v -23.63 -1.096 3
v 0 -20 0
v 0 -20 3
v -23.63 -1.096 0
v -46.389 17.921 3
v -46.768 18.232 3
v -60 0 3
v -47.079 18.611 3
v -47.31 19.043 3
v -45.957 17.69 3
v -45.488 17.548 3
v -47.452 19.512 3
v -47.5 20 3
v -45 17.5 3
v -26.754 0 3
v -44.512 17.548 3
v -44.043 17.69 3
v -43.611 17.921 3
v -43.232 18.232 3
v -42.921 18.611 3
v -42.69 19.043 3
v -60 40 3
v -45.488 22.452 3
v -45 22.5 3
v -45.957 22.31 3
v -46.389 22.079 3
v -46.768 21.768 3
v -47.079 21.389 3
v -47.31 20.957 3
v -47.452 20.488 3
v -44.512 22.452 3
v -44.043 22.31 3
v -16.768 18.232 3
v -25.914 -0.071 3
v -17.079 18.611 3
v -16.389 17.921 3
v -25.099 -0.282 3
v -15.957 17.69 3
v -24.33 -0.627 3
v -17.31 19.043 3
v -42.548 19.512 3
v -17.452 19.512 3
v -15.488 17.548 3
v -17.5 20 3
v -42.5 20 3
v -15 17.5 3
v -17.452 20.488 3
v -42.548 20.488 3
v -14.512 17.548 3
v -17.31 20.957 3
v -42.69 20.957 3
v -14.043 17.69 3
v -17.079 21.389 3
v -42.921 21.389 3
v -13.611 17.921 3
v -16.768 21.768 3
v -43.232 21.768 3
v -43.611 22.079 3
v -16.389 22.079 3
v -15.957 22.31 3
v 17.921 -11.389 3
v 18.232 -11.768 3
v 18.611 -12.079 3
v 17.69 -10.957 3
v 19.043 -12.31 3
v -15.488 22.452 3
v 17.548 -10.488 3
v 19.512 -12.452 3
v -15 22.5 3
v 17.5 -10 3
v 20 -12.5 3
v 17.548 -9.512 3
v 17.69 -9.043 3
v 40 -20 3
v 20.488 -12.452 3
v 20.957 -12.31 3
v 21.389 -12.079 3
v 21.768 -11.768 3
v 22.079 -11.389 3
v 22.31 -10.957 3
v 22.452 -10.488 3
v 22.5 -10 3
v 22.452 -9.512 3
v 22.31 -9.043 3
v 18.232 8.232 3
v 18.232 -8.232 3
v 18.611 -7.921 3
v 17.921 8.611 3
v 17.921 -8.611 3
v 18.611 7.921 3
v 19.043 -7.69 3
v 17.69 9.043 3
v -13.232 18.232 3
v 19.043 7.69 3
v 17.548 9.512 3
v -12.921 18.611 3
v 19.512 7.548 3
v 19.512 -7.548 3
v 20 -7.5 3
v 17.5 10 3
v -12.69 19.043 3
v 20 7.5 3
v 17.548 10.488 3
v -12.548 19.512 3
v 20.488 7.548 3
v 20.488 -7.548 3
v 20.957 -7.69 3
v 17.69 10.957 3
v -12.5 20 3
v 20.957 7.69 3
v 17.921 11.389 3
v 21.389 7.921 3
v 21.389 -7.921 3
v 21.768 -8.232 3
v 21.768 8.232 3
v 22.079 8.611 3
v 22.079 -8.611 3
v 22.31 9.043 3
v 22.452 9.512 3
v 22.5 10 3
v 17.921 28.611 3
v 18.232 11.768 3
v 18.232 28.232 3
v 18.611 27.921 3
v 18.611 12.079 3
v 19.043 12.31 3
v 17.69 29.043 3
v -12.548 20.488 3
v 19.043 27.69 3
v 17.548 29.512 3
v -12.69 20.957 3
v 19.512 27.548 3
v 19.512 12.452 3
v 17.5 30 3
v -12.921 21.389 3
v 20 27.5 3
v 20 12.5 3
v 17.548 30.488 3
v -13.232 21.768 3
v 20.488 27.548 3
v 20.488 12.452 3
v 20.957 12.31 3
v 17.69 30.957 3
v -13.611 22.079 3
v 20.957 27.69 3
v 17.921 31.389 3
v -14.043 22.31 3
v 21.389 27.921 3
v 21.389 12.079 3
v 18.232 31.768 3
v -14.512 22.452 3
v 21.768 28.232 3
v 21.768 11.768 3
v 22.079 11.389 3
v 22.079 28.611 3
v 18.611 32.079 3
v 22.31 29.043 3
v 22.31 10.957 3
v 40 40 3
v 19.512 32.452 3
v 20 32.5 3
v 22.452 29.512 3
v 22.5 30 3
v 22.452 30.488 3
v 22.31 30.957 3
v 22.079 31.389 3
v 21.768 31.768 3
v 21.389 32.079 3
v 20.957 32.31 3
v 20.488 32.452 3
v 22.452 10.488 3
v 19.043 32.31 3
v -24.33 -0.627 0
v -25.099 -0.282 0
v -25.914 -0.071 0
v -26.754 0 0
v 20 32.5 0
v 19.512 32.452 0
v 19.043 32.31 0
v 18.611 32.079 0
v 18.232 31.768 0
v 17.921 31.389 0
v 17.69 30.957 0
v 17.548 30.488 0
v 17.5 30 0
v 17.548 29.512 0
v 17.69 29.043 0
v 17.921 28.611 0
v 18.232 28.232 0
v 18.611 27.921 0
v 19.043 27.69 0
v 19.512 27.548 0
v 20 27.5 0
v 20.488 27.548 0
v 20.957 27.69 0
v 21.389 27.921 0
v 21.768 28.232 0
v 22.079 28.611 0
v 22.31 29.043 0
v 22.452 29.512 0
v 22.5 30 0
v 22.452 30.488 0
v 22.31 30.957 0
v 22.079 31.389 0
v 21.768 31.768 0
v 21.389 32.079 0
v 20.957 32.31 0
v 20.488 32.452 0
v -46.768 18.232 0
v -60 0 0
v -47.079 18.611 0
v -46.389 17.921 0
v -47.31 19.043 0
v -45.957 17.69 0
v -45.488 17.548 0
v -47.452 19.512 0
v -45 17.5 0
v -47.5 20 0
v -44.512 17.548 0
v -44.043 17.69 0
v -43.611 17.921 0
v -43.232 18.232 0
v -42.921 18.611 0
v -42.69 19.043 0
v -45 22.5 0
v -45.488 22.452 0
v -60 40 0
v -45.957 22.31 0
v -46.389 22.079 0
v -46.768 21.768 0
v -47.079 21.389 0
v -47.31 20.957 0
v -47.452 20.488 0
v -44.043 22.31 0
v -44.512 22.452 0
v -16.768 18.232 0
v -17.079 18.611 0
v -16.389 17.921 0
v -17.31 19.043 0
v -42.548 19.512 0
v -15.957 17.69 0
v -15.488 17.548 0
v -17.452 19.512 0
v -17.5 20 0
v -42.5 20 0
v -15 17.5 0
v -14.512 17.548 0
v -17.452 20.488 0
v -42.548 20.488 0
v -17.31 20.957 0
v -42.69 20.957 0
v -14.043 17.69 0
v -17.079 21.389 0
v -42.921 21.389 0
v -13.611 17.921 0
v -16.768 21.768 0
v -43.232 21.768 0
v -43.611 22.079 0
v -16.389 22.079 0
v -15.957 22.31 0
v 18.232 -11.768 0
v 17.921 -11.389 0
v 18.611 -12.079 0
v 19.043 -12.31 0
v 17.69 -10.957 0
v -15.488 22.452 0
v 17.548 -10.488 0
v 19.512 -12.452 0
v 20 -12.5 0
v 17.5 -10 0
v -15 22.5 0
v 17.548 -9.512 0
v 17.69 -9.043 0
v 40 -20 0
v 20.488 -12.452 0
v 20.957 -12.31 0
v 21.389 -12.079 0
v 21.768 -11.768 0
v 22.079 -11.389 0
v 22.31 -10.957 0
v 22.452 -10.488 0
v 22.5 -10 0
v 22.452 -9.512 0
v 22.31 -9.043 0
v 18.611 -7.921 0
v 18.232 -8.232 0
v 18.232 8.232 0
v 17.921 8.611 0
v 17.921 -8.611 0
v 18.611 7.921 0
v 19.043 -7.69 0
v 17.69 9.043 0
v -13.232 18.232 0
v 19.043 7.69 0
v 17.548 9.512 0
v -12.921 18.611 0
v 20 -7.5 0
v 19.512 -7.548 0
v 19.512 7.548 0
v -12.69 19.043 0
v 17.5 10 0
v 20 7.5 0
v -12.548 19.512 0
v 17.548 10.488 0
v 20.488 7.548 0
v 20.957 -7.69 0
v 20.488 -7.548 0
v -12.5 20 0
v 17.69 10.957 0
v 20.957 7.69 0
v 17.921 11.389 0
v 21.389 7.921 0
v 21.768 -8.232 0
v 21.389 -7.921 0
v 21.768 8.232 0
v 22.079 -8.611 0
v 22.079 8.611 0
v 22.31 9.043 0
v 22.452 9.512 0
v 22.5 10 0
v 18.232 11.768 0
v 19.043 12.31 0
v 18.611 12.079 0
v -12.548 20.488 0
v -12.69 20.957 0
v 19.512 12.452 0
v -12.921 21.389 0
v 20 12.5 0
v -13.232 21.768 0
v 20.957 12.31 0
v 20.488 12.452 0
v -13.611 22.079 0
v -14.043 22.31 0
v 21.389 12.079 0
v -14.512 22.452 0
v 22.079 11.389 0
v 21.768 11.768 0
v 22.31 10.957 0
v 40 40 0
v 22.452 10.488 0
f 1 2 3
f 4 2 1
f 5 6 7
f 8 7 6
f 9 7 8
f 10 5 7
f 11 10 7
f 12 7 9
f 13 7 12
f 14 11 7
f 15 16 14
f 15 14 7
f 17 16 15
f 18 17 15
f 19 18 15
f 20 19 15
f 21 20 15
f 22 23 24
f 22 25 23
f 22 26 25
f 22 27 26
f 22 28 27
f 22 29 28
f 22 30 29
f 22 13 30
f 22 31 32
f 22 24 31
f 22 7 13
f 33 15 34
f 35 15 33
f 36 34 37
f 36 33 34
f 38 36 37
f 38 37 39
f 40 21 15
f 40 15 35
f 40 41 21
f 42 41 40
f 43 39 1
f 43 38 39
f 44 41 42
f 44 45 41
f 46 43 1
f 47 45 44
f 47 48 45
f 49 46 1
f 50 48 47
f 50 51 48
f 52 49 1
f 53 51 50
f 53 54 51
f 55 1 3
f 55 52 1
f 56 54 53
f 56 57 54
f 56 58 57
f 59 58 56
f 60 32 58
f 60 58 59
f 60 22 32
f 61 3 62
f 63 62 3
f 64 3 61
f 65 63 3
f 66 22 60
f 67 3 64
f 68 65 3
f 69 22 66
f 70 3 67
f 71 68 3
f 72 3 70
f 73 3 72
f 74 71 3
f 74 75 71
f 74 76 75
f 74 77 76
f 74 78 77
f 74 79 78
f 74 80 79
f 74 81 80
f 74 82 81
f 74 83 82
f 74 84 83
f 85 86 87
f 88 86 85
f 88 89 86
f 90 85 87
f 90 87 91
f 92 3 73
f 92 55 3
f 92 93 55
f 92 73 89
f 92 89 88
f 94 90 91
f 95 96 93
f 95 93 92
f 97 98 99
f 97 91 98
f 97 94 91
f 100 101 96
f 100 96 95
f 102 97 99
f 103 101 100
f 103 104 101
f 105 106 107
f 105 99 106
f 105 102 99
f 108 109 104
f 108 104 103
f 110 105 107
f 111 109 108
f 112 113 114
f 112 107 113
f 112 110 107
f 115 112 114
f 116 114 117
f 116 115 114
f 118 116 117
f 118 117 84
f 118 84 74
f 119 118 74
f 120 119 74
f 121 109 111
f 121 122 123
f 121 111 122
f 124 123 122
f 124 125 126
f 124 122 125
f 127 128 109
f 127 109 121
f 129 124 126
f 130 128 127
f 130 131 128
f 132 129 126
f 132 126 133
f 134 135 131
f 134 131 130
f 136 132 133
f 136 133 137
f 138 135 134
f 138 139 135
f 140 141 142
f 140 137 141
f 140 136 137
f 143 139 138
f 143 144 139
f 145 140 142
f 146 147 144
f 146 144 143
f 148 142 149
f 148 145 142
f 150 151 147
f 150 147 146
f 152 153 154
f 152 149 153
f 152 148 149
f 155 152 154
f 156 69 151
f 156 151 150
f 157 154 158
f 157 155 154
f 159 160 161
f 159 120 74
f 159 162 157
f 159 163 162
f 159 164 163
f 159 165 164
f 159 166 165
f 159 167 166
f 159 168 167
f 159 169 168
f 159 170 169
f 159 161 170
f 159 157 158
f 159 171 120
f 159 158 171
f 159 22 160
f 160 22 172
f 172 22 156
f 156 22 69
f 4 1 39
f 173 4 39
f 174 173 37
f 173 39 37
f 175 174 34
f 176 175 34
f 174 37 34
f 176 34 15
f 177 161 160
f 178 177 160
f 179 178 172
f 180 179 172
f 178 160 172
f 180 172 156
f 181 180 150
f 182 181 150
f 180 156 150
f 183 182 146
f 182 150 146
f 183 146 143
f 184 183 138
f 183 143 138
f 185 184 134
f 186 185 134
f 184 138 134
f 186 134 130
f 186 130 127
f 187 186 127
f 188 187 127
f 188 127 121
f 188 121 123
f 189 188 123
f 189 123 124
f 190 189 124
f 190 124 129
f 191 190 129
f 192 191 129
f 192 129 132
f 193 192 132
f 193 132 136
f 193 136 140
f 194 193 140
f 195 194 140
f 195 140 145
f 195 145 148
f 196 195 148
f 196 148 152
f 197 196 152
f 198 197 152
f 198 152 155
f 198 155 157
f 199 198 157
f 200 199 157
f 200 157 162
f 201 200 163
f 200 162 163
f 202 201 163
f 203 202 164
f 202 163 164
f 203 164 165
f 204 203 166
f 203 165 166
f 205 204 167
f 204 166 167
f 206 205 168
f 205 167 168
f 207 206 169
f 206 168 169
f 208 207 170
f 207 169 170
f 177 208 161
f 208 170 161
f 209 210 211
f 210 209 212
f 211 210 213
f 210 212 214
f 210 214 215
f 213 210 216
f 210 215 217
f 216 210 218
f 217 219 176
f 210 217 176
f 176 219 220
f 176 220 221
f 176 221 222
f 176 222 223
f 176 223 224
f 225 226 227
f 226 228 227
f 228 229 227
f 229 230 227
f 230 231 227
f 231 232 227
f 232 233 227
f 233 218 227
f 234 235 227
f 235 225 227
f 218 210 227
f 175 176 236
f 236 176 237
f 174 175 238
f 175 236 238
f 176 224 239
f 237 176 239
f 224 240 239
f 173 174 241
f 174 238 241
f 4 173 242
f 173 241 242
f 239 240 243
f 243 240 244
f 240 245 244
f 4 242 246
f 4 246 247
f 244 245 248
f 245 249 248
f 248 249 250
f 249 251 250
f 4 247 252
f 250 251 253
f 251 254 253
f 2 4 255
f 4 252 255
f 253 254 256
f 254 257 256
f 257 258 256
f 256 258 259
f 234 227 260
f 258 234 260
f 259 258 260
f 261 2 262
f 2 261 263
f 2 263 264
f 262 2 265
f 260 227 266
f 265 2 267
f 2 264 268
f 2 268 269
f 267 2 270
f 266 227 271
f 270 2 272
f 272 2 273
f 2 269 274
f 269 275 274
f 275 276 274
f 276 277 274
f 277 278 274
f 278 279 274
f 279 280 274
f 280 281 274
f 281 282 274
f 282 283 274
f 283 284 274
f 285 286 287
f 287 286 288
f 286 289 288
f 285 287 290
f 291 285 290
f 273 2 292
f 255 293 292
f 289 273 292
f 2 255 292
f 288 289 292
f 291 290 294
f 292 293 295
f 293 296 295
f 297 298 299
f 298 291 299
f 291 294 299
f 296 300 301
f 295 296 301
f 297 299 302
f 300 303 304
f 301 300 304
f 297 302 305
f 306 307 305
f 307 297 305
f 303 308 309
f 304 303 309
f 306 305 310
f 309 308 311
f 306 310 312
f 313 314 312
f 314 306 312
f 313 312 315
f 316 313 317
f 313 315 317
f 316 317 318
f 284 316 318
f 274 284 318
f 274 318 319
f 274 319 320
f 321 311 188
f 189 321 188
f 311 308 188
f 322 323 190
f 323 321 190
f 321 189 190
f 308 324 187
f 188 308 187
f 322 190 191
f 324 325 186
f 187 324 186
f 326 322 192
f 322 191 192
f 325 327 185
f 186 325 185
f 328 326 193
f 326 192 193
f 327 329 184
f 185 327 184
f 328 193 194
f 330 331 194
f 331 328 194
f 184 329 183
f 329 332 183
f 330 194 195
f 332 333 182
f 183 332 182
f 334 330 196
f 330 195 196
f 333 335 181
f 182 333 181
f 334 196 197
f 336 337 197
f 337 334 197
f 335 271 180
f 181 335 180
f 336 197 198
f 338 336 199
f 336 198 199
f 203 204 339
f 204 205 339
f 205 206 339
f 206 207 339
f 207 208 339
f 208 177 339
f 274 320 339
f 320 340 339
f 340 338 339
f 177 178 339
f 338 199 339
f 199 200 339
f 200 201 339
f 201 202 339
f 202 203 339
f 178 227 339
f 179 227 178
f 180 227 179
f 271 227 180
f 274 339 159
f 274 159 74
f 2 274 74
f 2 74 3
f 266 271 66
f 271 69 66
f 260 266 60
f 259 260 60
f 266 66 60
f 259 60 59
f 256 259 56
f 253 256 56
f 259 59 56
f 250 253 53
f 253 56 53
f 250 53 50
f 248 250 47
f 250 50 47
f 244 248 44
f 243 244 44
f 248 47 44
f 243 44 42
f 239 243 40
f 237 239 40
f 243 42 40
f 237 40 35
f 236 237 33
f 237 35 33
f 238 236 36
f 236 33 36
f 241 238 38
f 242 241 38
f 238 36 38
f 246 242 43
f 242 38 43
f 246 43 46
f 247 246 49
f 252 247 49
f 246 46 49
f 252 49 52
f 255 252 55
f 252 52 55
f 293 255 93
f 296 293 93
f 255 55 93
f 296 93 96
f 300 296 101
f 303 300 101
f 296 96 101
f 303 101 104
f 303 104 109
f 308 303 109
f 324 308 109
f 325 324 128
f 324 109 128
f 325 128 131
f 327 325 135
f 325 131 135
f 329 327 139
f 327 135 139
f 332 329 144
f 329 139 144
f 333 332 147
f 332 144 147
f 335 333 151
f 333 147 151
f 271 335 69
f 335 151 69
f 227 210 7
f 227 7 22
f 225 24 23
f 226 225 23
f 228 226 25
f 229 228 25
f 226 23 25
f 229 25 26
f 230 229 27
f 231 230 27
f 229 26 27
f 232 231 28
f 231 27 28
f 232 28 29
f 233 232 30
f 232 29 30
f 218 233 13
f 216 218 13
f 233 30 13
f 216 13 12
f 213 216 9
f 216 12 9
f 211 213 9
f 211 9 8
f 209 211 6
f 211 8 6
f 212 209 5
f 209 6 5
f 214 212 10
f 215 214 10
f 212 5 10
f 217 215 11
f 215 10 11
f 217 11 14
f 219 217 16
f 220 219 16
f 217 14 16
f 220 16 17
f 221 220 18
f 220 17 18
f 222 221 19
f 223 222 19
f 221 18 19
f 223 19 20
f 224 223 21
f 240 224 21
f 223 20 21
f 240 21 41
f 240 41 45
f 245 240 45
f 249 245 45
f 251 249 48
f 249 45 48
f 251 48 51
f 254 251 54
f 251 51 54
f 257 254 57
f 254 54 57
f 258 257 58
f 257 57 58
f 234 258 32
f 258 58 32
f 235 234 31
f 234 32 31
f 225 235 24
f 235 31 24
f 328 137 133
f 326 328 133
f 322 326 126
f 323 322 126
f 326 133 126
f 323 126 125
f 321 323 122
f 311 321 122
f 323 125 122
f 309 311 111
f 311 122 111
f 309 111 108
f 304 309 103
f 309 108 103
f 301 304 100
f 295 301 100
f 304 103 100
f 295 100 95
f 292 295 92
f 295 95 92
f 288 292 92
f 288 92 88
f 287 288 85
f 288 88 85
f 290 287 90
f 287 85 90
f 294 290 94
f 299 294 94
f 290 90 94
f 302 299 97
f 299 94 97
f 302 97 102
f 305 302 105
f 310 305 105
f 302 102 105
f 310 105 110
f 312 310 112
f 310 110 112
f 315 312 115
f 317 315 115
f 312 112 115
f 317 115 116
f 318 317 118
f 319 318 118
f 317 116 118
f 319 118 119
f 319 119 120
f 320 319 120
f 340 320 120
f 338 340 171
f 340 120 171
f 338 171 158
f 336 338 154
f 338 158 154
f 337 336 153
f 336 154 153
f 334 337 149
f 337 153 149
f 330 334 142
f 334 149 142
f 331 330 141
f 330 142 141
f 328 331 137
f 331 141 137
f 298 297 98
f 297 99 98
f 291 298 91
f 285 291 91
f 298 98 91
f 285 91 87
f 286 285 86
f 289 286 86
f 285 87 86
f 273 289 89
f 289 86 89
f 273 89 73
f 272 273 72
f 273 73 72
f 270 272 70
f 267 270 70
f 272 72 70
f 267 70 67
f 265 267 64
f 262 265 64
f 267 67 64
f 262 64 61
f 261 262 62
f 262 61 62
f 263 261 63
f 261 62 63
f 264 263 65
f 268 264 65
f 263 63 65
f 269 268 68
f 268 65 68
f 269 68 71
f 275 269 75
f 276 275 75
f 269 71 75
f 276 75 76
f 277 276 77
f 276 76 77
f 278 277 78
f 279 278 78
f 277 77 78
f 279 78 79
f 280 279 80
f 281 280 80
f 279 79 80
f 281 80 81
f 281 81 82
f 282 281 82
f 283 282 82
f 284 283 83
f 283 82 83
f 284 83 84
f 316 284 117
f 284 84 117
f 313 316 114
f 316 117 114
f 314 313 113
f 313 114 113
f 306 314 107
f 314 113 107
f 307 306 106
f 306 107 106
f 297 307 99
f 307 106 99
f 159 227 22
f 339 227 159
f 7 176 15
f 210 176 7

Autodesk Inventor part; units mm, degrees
ref_plane "YZ Plane" through (0, 0, 0) normal (1, 0, 0) x (0, 1, 0)
ref_plane "XZ Plane" through (0, 0, 0) normal (0, 1, 0) x (-1, 0, 0)
ref_plane "XY Plane" through (0, 0, 0) normal (0, 0, 1) x (1, 0, 0)
sketch "Sketch1" plane through (0, 0, 0) normal (0, 0, 1) x (1, 0, 0)
  line L0 (0, 0) -> (0, 40) construction
  line L1 (0, 40) -> (-420, 40) construction
  line L2 (-420, 0) -> (-420, 40) construction
  line L3 (0, 0) -> (-420, 0) construction
  line L4 (40, 120) -> (0, 120) construction
  line L5 (0, 120) -> (0, -730) construction
  line L6 (40, -730) -> (0, -730) construction
  line L7 (40, 120) -> (40, -730) construction
  line L8 (0, 0) -> (40, 0) construction
  line L9 (40, 0) -> (40, 40) construction
  line L10 (40, 40) -> (0, 40) construction
  line L11 (0, 40) -> (0, 0) construction
  line L12 (0, 0) -> (-60, 0) construction
  line L13 (-60, 0) -> (-60, 40) construction
  line L14 (-60, 40) -> (0, 40) construction
  line L15 (0, 40) -> (0, 0) construction
  line L16 (-23.6304, 41.0957) -> (-1.8765, 58.4988) construction
  line L17 (0, 40) -> (40, 40) construction
  line L18 (40, 40) -> (40, 60) construction
  line L19 (40, 60) -> (0, 60) construction
  line L20 (0, 60) -> (0, 40) construction
  line L21 (-1.8765, 58.4988) -> (0, 60) construction
  line L22 (-23.6304, 41.0957) -> (-25, 40) construction
  line L23 (40, 0) -> (0, 0) construction
  line L24 (0, 0) -> (0, -20) construction
  line L25 (0, -20) -> (40, -20) construction
  line L26 (40, -20) -> (40, 0) construction
  line L27 (-25, 40) -> (-25, 0) construction
  line L28 (-25, 0) -> (0, -20) construction
  line L29 (20, -20) -> (20, 60) construction
  line L30 (0, 20) -> (-60, 20) construction
  line L31 (30, 10) -> (10, 10) construction
  line L32 (10, 10) -> (10, -10) construction
  line L33 (10, -10) -> (30, -10) construction
  line L34 (30, -10) -> (30, 10) construction
  line L35 (30, 10) -> (10, -10) construction
  line L36 (10, 10) -> (30, -10) construction
  line L37 (30, 30) -> (10, 30) construction
  line L38 (10, 30) -> (10, 50) construction
  line L39 (10, 50) -> (30, 50) construction
  line L40 (30, 50) -> (30, 30) construction
  line L41 (30, 30) -> (10, 50) construction
  line L42 (10, 30) -> (30, 50) construction
  line L43 (0, -20) -> (-25, 0)
  line L44 (-25, 0) -> (-60, 0)
  line L45 (-60, 0) -> (-60, 40)
  line L46 (-60, 40) -> (-25, 40)
  line L47 (-25, 40) -> (0, 60)
  line L48 (0, 60) -> (40, 60)
  line L49 (40, 60) -> (40, -20)
  line L50 (40, -20) -> (0, -20)
  line L51 (-30, 20) -> (-45, 20)
  line L52 (-30, 20) -> (-15, 20)
  point P0 (20, 0)
  point P1 (20, 0)
  point P2 (20, 40)
  point P3 (20, 30)
  point P4 (20, 10)
  point P5 (20, -10)
  dimension "d0" = 60
  dimension "d1" = 40
  dimension "d2" = 20
  dimension "d3" = 20
  dimension "d6" = 20
  dimension "d7" = 20
  dimension "d8" = 20
  dimension "d9" = 20
  dimension "d20" = 15
  dimension "d21" = 15
extrude "Extrusion1" add sketch "Sketch1" along normal blind 3
hole "Hole1" at (20, -10, 0) at (20, 10, 0) at (20, 30, 0) direction (0, 0, 1) diameter 5 depth 8 tip angle 118
fillet "Fillet1" radius 5 2 edges at (-25, 40, 1.5) (-25, 0, 1.5)
hole "Hole2" at (-45, 20, 0) at (-15, 20, 0) direction (0, 0, 1) diameter 5 depth 8 tip angle 118
sketch "Sketch2" plane through (0, 0, 3) normal (0, 0, 1) x (1, 0, 0)
  circle A0 centre (-45, 20) radius 2.5 projected
  circle A1 centre (-15, 20) radius 2.5 projected
  line L0 (40, -20) -> (40, 60) projected
  line L1 (40, 60) -> (0, 60) projected
  line L2 (0, 60) -> (-23.6304, 41.0957) projected
  arc A2 (-26.7539, 40) -> (-23.6304, 41.0957) centre (-26.7539, 45) ccw projected
  line L3 (-26.7539, 40) -> (-60, 40) projected
  line L4 (-60, 40) -> (-60, 0) projected
  line L5 (-60, 0) -> (-26.7539, 0) projected
  arc A3 (-23.6304, -1.0957) -> (-26.7539, 0) centre (-26.7539, -5) ccw projected
  line L6 (-23.6304, -1.0957) -> (0, -20) projected
  line L7 (0, -20) -> (40, -20) projected
  line L8 (-26.7539, 40) -> (-60, 40) projected
  line L9 (-26.7539, 40) -> (40, 40)
  point P0 (0, 0)
extrude "Extrusion2" cut sketch "Sketch2" against normal blind 3 contours L9 A2 L2 L1 L0
properties part number "bigusset"
